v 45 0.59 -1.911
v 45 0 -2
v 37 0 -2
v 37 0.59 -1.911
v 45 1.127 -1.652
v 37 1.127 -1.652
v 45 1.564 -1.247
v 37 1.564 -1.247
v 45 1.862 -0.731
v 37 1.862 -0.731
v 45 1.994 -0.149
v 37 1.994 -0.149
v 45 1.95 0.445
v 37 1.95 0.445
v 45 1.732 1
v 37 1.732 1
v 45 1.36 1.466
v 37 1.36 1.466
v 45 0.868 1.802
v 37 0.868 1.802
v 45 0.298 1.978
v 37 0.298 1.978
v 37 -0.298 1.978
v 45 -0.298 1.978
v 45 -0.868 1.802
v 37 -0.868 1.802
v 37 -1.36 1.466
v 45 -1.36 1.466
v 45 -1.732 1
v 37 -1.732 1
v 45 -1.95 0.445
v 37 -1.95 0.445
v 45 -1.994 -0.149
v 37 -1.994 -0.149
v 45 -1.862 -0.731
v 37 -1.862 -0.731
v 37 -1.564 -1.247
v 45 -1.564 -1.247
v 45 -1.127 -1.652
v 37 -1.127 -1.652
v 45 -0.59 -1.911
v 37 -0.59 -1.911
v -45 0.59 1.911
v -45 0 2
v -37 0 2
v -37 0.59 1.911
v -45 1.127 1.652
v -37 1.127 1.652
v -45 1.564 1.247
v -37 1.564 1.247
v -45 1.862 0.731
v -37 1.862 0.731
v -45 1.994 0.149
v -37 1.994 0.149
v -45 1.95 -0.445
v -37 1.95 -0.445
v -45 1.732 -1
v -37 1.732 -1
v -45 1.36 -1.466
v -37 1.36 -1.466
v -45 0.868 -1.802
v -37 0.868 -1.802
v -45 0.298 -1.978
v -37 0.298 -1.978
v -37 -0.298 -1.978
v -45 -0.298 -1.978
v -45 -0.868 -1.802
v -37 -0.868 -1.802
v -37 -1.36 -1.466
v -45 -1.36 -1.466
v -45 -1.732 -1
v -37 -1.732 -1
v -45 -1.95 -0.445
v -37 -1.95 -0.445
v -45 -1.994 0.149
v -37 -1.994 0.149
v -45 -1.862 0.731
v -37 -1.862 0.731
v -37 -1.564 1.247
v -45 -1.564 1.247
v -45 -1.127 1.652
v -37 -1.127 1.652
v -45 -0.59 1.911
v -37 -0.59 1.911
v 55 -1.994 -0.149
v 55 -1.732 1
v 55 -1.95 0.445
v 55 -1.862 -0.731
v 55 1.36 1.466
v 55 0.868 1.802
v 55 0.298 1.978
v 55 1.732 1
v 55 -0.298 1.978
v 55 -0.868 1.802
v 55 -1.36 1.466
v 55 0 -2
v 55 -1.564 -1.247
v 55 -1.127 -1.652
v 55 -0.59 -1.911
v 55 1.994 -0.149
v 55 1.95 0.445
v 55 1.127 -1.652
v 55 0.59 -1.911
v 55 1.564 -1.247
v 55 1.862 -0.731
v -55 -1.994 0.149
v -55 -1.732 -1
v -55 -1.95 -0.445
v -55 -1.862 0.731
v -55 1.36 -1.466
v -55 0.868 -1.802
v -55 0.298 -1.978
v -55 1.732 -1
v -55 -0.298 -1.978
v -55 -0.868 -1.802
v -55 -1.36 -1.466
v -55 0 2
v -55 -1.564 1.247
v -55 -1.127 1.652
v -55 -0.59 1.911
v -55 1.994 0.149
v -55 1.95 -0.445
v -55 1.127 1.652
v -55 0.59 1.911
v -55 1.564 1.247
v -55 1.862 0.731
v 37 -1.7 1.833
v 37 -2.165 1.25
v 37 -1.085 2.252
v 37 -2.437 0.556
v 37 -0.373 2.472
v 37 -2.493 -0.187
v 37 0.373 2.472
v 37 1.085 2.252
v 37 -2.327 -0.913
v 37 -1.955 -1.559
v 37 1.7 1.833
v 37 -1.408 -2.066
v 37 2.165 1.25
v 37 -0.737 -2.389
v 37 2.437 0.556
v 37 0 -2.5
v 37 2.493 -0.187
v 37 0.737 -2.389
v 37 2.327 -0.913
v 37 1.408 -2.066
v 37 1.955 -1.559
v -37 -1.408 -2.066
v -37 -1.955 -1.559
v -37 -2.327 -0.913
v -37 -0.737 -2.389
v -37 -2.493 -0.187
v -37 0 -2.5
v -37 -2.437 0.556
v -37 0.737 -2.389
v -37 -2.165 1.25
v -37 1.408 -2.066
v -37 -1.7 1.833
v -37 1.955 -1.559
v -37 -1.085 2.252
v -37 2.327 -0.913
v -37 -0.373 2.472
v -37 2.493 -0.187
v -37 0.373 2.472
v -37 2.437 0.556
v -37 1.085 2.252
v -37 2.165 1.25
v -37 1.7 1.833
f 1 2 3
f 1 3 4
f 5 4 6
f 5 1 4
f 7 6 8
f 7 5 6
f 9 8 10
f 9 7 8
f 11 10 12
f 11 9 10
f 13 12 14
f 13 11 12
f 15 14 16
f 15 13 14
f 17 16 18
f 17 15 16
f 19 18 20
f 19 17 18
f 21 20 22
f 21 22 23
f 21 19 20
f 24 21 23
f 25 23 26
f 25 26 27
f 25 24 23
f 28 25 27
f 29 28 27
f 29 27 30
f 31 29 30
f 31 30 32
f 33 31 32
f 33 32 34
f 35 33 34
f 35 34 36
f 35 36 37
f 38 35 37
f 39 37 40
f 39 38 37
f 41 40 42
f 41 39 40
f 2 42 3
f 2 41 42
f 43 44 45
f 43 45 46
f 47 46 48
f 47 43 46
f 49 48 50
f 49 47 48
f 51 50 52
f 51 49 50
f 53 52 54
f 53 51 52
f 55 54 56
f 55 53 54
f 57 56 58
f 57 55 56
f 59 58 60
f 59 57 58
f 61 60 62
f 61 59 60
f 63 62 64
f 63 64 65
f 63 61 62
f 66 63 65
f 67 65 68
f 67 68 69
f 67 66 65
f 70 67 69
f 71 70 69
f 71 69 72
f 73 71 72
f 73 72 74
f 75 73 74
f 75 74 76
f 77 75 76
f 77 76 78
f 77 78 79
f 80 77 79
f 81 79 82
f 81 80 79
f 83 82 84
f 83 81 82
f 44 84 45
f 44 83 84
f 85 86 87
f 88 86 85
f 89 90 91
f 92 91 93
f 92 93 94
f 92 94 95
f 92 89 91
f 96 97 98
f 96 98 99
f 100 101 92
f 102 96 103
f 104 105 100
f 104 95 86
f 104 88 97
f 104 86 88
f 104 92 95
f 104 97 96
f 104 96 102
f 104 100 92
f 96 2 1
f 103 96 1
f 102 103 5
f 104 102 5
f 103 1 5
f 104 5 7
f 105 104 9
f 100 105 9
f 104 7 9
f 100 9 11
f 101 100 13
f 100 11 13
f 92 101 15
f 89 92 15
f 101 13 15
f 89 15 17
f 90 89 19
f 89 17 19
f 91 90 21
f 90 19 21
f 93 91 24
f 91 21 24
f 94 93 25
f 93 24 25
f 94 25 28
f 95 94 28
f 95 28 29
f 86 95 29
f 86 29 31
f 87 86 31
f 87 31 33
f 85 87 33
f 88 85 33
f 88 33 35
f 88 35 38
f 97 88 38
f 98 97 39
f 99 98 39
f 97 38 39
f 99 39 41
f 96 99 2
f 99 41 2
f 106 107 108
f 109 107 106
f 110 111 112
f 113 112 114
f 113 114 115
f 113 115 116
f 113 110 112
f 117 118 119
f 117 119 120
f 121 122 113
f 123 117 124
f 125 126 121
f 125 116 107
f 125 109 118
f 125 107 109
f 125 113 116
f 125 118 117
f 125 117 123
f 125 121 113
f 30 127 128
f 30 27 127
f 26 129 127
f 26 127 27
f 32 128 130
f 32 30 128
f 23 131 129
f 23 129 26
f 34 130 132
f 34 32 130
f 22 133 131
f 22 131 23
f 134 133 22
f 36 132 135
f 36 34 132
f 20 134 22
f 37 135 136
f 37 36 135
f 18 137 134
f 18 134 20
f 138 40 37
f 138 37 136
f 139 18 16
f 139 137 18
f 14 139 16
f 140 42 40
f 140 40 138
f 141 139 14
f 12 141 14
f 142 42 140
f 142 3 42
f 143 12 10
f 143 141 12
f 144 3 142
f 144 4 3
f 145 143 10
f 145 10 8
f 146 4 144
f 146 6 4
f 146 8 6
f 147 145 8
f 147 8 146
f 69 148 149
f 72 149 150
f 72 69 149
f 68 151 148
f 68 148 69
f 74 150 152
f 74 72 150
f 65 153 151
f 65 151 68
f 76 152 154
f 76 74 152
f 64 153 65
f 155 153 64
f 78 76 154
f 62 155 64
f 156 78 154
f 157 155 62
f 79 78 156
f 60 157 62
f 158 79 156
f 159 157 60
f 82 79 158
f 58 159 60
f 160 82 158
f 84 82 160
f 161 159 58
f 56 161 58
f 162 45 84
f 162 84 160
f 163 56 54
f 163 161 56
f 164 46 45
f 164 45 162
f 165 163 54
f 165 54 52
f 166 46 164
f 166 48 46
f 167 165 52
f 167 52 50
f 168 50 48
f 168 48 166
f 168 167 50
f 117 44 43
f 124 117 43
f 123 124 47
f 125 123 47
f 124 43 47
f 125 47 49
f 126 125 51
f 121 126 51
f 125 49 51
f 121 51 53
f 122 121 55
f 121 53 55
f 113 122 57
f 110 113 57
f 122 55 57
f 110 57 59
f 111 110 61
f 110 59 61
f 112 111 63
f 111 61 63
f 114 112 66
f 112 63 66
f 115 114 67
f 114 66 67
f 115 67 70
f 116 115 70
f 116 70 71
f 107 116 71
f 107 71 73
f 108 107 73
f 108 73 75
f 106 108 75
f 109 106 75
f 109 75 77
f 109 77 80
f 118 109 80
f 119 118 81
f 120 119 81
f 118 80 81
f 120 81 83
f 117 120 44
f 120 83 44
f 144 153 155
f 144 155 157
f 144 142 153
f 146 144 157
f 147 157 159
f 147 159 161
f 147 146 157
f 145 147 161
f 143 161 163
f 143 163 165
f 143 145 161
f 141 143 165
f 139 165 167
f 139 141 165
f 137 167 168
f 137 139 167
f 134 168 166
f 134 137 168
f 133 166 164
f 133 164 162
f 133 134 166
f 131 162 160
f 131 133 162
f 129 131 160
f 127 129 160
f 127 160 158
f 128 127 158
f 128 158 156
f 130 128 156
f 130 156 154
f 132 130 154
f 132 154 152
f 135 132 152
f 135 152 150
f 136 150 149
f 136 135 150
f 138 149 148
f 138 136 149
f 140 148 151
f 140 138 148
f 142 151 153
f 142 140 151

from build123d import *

# Parameters (mm, degrees)
SKETCH1_R           = 2.5
BOSS_EXTRUDE1_DEPTH = 45
SKETCH2_R           = 2.5
SKETCH2_R_2         = 2
CUT_EXTRUDE1_DEPTH  = 8
SKETCH3_R           = 2.5
SKETCH3_R_2         = 2
CUT_EXTRUDE2_DEPTH  = 8
SKETCH4_R           = 2
BOSS_EXTRUDE2_DEPTH = 10
SKETCH5_R           = 2
BOSS_EXTRUDE3_DEPTH = 10


with BuildPart() as part:
    # Sketch1 → Boss-Extrude1 (new body, symmetric)
    with BuildSketch(Plane(origin=(0, 0, 0), x_dir=(0, 0, -1), z_dir=(1, 0, 0))):
        Circle(SKETCH1_R)
    extrude(amount=BOSS_EXTRUDE1_DEPTH, both=True)

    # Sketch2 → Cut-Extrude1 (cut)
    with BuildSketch(Plane(origin=(45, 0, 0), x_dir=(0, 0, -1), z_dir=(1, 0, 0))):
        Circle(SKETCH2_R)
        Circle(SKETCH2_R_2, mode=Mode.SUBTRACT)
    extrude(amount=-CUT_EXTRUDE1_DEPTH, mode=Mode.SUBTRACT)

    # Sketch3 → Cut-Extrude2 (cut)
    with BuildSketch(Plane.ZY.offset(45)):
        Circle(SKETCH3_R)
        Circle(SKETCH3_R_2, mode=Mode.SUBTRACT)
    extrude(amount=-CUT_EXTRUDE2_DEPTH, mode=Mode.SUBTRACT)

    # Sketch4 → Boss-Extrude2 (add)
    with BuildSketch(Plane(origin=(45, 0, 0), x_dir=(0, 0, -1), z_dir=(1, 0, 0))):
        Circle(SKETCH4_R)
    extrude(amount=BOSS_EXTRUDE2_DEPTH)

    # Sketch5 → Boss-Extrude3 (add)
    with BuildSketch(Plane.ZY.offset(45)):
        Circle(SKETCH5_R)
    extrude(amount=BOSS_EXTRUDE3_DEPTH)


solid = part.part
